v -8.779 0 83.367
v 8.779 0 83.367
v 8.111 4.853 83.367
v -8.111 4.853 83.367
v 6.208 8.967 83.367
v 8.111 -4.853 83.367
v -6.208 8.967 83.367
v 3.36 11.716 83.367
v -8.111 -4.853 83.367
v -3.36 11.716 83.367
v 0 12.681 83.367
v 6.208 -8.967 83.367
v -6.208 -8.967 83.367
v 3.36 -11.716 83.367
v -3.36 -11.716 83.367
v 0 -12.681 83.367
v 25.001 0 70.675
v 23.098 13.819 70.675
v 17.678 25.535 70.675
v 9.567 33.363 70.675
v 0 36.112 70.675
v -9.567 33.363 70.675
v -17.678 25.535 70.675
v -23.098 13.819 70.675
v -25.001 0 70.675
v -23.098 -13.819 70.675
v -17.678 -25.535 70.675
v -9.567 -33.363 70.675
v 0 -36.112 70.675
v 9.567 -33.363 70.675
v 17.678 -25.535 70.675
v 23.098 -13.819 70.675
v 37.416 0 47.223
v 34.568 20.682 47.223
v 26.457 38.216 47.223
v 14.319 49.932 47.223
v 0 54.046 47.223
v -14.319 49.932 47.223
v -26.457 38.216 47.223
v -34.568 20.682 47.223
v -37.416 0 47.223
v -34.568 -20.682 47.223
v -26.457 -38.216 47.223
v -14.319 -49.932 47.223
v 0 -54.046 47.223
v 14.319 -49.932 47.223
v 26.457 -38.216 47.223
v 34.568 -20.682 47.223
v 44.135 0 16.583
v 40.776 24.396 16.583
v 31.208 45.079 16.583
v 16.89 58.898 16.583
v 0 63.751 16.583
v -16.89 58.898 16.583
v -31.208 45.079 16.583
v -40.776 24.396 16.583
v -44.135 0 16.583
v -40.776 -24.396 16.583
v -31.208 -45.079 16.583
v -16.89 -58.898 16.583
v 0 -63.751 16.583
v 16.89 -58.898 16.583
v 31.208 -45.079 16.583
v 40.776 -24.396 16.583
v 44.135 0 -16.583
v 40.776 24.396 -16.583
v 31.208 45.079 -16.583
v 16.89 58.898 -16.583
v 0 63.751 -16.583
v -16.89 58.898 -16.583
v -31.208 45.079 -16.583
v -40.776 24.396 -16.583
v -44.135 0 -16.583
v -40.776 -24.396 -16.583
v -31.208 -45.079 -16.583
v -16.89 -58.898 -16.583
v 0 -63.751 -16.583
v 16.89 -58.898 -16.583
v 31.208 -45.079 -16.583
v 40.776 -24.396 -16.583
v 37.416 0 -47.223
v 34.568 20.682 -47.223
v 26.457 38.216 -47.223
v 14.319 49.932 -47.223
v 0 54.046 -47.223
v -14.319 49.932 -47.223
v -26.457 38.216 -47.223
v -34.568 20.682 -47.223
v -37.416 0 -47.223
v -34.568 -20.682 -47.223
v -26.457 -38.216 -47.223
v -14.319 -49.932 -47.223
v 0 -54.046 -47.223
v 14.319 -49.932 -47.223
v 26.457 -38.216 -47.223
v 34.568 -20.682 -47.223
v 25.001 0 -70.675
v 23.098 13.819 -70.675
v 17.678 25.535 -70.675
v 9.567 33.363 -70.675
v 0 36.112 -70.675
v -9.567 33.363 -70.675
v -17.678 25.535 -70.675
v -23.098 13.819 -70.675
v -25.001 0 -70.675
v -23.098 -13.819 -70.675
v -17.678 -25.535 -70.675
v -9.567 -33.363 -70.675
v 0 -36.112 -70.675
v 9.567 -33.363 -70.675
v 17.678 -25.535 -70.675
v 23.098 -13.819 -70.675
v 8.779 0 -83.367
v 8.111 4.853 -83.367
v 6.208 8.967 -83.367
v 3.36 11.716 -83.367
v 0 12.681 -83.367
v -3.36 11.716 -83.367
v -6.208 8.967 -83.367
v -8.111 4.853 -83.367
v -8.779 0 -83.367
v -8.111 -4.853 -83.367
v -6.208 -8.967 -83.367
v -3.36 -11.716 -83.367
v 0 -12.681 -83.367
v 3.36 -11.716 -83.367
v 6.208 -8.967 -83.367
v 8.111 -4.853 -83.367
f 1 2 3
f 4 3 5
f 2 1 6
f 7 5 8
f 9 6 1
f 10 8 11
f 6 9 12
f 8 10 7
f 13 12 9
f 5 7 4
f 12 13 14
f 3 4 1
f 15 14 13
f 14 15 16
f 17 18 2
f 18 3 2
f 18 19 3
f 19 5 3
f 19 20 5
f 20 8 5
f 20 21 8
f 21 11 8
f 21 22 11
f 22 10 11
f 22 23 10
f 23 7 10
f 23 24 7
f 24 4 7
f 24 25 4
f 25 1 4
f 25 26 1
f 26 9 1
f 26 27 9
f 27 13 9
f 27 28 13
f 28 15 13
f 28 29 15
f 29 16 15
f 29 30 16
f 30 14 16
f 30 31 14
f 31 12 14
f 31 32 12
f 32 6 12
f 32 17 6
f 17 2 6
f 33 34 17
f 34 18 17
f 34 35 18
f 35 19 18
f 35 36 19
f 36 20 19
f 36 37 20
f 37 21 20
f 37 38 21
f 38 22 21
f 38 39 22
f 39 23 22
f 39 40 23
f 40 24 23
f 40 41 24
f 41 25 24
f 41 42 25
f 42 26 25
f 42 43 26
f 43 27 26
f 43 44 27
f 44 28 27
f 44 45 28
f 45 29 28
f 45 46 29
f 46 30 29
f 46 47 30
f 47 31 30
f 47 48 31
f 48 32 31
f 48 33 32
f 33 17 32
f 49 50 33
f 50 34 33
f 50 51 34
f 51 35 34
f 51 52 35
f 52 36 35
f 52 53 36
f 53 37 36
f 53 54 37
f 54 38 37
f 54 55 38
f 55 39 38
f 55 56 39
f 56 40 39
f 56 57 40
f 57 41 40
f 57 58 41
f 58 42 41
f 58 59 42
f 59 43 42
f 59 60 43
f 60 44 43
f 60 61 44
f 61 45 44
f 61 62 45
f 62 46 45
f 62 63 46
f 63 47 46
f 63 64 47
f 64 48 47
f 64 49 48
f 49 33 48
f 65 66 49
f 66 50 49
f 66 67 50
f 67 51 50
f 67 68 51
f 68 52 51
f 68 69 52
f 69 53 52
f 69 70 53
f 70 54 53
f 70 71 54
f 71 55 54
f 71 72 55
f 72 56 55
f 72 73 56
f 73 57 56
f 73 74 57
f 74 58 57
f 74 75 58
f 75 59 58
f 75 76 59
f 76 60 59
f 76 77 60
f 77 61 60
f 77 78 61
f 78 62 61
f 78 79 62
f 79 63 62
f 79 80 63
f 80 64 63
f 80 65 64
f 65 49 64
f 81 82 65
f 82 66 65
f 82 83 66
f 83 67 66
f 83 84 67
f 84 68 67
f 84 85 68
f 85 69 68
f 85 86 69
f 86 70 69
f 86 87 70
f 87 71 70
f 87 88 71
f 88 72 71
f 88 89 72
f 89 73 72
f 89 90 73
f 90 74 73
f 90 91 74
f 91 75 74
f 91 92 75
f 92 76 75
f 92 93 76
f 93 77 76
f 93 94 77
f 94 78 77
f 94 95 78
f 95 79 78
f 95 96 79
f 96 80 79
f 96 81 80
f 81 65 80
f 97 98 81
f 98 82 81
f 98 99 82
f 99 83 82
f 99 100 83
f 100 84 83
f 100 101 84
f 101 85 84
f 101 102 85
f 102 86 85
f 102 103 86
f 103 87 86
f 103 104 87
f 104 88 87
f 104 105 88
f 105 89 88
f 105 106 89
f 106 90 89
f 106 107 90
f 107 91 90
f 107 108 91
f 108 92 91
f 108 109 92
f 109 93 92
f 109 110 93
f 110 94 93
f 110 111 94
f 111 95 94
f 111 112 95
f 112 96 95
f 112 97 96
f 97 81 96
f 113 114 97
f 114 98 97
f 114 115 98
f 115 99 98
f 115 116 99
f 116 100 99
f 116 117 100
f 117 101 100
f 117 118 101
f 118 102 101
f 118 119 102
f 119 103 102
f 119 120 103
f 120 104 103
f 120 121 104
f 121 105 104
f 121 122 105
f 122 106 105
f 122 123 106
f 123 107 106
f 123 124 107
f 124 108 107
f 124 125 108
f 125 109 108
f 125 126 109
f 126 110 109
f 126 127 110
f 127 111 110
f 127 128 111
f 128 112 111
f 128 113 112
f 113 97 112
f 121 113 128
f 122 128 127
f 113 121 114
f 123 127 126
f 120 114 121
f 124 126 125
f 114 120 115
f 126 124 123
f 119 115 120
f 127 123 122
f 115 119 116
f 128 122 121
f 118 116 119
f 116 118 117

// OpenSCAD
// Generated by SolidPython 1.0.1 on 2020-07-29 00:46:49


scale(v = [9, 13, 17]) {
	sphere(r = 5);
}
/***********************************************
*********      SolidPython code:      **********
************************************************
 
# import packages: SolidPython
from solid import *
from solid.utils import *
from itertools import chain, combinations, permutations


class Resize:

    def __init__(self, scad_file):
        self.scad_file = scad_file
        #self.scad_file = import_scad(scad_file)
        # cone/cylinder param:
        self.r1 = 0
        self.r2 = 0
        self.h = 0
        # rectangular prism param:
        self.w = 0
        self.l = 0
        # ellipse param:
        self.r = 0

    # import OpenScad code (file name corresponds to shape)


    # classify shape + parameters
    def assign(self, param1, param2, param3):
        if self.scad_file == 'cone.scad':
            self.r1 = param1
            self.r2 = param2
            self.h = param3
        elif self.scad_file == 'cylinder.scad':
            self.r1 = param1
            self.r2 = param2
            self.h = param3
        elif self.scad_file == 'rectangularPrism.scad':
            self.h = param1
            self.l = param2
            self.w = param3
        else:
            self.r = param1
            self.h = param2

    # resize parameters
    def iterate(self):
        x = range(3, 20, 2)
        i = 1
        if self.scad_file == 'cone.scad':
            tempList = list(permutations(x, 2))
            for temp in tempList:
                param1 = temp[0]
                param2 = temp[1]
                filepath = 'produced_scad_files/' + 'cone' + str(param1) + '_' + str(param2) + '_' + '.scad'
                scad_render_to_file(cylinder(h=param1, r1=param2, r2=0), filepath)

        elif self.scad_file == 'cylinder.scad':
            tempList = list(permutations(x, 3))
            for temp in tempList:
                param1 = temp[0]
                param2 = temp[1]
                filepath = 'produced_scad_files/' + 'cylinder' + str(param1) + '_' + str(param2) + '_' + '.scad'
                scad_render_to_file(cylinder(h=param1, r1=param2, r2=param2), filepath)

        elif self.scad_file == 'rectangularPrism.scad':
            tempList = list(permutations(x, 3))
            for temp in tempList:
                param1 = temp[0]
                param2 = temp[1]
                param3 = temp[2]
                filepath = 'produced_scad_files/' + 'rectangularPrism' + str(param1) + '_' + str(param2) + '_' + str(
                    param3) + '.scad'
                scad_render_to_file(cube(size=(param1, param2, param3)), filepath)

        elif self.scad_file == 'ellipse.scad':
            tempList = list(permutations(x, 4))
            for temp in tempList:
                param1 = temp[0]
                param2 = temp[1]
                param3 = temp[2]
                param4 = temp[3]
                filepath = 'produced_scad_files/' + 'ellipse' + str(param1) + '_' + str(param2) + '_' + str(param3) + '_' + str(param4) + '.scad'
                scad_render_to_file(scale([param1, param2, param3])(sphere(r=param4)), filepath)

    def render_to_scadfile(self):
        scad_render_to_file(scad, 'example.scad') 
 
************************************************/
